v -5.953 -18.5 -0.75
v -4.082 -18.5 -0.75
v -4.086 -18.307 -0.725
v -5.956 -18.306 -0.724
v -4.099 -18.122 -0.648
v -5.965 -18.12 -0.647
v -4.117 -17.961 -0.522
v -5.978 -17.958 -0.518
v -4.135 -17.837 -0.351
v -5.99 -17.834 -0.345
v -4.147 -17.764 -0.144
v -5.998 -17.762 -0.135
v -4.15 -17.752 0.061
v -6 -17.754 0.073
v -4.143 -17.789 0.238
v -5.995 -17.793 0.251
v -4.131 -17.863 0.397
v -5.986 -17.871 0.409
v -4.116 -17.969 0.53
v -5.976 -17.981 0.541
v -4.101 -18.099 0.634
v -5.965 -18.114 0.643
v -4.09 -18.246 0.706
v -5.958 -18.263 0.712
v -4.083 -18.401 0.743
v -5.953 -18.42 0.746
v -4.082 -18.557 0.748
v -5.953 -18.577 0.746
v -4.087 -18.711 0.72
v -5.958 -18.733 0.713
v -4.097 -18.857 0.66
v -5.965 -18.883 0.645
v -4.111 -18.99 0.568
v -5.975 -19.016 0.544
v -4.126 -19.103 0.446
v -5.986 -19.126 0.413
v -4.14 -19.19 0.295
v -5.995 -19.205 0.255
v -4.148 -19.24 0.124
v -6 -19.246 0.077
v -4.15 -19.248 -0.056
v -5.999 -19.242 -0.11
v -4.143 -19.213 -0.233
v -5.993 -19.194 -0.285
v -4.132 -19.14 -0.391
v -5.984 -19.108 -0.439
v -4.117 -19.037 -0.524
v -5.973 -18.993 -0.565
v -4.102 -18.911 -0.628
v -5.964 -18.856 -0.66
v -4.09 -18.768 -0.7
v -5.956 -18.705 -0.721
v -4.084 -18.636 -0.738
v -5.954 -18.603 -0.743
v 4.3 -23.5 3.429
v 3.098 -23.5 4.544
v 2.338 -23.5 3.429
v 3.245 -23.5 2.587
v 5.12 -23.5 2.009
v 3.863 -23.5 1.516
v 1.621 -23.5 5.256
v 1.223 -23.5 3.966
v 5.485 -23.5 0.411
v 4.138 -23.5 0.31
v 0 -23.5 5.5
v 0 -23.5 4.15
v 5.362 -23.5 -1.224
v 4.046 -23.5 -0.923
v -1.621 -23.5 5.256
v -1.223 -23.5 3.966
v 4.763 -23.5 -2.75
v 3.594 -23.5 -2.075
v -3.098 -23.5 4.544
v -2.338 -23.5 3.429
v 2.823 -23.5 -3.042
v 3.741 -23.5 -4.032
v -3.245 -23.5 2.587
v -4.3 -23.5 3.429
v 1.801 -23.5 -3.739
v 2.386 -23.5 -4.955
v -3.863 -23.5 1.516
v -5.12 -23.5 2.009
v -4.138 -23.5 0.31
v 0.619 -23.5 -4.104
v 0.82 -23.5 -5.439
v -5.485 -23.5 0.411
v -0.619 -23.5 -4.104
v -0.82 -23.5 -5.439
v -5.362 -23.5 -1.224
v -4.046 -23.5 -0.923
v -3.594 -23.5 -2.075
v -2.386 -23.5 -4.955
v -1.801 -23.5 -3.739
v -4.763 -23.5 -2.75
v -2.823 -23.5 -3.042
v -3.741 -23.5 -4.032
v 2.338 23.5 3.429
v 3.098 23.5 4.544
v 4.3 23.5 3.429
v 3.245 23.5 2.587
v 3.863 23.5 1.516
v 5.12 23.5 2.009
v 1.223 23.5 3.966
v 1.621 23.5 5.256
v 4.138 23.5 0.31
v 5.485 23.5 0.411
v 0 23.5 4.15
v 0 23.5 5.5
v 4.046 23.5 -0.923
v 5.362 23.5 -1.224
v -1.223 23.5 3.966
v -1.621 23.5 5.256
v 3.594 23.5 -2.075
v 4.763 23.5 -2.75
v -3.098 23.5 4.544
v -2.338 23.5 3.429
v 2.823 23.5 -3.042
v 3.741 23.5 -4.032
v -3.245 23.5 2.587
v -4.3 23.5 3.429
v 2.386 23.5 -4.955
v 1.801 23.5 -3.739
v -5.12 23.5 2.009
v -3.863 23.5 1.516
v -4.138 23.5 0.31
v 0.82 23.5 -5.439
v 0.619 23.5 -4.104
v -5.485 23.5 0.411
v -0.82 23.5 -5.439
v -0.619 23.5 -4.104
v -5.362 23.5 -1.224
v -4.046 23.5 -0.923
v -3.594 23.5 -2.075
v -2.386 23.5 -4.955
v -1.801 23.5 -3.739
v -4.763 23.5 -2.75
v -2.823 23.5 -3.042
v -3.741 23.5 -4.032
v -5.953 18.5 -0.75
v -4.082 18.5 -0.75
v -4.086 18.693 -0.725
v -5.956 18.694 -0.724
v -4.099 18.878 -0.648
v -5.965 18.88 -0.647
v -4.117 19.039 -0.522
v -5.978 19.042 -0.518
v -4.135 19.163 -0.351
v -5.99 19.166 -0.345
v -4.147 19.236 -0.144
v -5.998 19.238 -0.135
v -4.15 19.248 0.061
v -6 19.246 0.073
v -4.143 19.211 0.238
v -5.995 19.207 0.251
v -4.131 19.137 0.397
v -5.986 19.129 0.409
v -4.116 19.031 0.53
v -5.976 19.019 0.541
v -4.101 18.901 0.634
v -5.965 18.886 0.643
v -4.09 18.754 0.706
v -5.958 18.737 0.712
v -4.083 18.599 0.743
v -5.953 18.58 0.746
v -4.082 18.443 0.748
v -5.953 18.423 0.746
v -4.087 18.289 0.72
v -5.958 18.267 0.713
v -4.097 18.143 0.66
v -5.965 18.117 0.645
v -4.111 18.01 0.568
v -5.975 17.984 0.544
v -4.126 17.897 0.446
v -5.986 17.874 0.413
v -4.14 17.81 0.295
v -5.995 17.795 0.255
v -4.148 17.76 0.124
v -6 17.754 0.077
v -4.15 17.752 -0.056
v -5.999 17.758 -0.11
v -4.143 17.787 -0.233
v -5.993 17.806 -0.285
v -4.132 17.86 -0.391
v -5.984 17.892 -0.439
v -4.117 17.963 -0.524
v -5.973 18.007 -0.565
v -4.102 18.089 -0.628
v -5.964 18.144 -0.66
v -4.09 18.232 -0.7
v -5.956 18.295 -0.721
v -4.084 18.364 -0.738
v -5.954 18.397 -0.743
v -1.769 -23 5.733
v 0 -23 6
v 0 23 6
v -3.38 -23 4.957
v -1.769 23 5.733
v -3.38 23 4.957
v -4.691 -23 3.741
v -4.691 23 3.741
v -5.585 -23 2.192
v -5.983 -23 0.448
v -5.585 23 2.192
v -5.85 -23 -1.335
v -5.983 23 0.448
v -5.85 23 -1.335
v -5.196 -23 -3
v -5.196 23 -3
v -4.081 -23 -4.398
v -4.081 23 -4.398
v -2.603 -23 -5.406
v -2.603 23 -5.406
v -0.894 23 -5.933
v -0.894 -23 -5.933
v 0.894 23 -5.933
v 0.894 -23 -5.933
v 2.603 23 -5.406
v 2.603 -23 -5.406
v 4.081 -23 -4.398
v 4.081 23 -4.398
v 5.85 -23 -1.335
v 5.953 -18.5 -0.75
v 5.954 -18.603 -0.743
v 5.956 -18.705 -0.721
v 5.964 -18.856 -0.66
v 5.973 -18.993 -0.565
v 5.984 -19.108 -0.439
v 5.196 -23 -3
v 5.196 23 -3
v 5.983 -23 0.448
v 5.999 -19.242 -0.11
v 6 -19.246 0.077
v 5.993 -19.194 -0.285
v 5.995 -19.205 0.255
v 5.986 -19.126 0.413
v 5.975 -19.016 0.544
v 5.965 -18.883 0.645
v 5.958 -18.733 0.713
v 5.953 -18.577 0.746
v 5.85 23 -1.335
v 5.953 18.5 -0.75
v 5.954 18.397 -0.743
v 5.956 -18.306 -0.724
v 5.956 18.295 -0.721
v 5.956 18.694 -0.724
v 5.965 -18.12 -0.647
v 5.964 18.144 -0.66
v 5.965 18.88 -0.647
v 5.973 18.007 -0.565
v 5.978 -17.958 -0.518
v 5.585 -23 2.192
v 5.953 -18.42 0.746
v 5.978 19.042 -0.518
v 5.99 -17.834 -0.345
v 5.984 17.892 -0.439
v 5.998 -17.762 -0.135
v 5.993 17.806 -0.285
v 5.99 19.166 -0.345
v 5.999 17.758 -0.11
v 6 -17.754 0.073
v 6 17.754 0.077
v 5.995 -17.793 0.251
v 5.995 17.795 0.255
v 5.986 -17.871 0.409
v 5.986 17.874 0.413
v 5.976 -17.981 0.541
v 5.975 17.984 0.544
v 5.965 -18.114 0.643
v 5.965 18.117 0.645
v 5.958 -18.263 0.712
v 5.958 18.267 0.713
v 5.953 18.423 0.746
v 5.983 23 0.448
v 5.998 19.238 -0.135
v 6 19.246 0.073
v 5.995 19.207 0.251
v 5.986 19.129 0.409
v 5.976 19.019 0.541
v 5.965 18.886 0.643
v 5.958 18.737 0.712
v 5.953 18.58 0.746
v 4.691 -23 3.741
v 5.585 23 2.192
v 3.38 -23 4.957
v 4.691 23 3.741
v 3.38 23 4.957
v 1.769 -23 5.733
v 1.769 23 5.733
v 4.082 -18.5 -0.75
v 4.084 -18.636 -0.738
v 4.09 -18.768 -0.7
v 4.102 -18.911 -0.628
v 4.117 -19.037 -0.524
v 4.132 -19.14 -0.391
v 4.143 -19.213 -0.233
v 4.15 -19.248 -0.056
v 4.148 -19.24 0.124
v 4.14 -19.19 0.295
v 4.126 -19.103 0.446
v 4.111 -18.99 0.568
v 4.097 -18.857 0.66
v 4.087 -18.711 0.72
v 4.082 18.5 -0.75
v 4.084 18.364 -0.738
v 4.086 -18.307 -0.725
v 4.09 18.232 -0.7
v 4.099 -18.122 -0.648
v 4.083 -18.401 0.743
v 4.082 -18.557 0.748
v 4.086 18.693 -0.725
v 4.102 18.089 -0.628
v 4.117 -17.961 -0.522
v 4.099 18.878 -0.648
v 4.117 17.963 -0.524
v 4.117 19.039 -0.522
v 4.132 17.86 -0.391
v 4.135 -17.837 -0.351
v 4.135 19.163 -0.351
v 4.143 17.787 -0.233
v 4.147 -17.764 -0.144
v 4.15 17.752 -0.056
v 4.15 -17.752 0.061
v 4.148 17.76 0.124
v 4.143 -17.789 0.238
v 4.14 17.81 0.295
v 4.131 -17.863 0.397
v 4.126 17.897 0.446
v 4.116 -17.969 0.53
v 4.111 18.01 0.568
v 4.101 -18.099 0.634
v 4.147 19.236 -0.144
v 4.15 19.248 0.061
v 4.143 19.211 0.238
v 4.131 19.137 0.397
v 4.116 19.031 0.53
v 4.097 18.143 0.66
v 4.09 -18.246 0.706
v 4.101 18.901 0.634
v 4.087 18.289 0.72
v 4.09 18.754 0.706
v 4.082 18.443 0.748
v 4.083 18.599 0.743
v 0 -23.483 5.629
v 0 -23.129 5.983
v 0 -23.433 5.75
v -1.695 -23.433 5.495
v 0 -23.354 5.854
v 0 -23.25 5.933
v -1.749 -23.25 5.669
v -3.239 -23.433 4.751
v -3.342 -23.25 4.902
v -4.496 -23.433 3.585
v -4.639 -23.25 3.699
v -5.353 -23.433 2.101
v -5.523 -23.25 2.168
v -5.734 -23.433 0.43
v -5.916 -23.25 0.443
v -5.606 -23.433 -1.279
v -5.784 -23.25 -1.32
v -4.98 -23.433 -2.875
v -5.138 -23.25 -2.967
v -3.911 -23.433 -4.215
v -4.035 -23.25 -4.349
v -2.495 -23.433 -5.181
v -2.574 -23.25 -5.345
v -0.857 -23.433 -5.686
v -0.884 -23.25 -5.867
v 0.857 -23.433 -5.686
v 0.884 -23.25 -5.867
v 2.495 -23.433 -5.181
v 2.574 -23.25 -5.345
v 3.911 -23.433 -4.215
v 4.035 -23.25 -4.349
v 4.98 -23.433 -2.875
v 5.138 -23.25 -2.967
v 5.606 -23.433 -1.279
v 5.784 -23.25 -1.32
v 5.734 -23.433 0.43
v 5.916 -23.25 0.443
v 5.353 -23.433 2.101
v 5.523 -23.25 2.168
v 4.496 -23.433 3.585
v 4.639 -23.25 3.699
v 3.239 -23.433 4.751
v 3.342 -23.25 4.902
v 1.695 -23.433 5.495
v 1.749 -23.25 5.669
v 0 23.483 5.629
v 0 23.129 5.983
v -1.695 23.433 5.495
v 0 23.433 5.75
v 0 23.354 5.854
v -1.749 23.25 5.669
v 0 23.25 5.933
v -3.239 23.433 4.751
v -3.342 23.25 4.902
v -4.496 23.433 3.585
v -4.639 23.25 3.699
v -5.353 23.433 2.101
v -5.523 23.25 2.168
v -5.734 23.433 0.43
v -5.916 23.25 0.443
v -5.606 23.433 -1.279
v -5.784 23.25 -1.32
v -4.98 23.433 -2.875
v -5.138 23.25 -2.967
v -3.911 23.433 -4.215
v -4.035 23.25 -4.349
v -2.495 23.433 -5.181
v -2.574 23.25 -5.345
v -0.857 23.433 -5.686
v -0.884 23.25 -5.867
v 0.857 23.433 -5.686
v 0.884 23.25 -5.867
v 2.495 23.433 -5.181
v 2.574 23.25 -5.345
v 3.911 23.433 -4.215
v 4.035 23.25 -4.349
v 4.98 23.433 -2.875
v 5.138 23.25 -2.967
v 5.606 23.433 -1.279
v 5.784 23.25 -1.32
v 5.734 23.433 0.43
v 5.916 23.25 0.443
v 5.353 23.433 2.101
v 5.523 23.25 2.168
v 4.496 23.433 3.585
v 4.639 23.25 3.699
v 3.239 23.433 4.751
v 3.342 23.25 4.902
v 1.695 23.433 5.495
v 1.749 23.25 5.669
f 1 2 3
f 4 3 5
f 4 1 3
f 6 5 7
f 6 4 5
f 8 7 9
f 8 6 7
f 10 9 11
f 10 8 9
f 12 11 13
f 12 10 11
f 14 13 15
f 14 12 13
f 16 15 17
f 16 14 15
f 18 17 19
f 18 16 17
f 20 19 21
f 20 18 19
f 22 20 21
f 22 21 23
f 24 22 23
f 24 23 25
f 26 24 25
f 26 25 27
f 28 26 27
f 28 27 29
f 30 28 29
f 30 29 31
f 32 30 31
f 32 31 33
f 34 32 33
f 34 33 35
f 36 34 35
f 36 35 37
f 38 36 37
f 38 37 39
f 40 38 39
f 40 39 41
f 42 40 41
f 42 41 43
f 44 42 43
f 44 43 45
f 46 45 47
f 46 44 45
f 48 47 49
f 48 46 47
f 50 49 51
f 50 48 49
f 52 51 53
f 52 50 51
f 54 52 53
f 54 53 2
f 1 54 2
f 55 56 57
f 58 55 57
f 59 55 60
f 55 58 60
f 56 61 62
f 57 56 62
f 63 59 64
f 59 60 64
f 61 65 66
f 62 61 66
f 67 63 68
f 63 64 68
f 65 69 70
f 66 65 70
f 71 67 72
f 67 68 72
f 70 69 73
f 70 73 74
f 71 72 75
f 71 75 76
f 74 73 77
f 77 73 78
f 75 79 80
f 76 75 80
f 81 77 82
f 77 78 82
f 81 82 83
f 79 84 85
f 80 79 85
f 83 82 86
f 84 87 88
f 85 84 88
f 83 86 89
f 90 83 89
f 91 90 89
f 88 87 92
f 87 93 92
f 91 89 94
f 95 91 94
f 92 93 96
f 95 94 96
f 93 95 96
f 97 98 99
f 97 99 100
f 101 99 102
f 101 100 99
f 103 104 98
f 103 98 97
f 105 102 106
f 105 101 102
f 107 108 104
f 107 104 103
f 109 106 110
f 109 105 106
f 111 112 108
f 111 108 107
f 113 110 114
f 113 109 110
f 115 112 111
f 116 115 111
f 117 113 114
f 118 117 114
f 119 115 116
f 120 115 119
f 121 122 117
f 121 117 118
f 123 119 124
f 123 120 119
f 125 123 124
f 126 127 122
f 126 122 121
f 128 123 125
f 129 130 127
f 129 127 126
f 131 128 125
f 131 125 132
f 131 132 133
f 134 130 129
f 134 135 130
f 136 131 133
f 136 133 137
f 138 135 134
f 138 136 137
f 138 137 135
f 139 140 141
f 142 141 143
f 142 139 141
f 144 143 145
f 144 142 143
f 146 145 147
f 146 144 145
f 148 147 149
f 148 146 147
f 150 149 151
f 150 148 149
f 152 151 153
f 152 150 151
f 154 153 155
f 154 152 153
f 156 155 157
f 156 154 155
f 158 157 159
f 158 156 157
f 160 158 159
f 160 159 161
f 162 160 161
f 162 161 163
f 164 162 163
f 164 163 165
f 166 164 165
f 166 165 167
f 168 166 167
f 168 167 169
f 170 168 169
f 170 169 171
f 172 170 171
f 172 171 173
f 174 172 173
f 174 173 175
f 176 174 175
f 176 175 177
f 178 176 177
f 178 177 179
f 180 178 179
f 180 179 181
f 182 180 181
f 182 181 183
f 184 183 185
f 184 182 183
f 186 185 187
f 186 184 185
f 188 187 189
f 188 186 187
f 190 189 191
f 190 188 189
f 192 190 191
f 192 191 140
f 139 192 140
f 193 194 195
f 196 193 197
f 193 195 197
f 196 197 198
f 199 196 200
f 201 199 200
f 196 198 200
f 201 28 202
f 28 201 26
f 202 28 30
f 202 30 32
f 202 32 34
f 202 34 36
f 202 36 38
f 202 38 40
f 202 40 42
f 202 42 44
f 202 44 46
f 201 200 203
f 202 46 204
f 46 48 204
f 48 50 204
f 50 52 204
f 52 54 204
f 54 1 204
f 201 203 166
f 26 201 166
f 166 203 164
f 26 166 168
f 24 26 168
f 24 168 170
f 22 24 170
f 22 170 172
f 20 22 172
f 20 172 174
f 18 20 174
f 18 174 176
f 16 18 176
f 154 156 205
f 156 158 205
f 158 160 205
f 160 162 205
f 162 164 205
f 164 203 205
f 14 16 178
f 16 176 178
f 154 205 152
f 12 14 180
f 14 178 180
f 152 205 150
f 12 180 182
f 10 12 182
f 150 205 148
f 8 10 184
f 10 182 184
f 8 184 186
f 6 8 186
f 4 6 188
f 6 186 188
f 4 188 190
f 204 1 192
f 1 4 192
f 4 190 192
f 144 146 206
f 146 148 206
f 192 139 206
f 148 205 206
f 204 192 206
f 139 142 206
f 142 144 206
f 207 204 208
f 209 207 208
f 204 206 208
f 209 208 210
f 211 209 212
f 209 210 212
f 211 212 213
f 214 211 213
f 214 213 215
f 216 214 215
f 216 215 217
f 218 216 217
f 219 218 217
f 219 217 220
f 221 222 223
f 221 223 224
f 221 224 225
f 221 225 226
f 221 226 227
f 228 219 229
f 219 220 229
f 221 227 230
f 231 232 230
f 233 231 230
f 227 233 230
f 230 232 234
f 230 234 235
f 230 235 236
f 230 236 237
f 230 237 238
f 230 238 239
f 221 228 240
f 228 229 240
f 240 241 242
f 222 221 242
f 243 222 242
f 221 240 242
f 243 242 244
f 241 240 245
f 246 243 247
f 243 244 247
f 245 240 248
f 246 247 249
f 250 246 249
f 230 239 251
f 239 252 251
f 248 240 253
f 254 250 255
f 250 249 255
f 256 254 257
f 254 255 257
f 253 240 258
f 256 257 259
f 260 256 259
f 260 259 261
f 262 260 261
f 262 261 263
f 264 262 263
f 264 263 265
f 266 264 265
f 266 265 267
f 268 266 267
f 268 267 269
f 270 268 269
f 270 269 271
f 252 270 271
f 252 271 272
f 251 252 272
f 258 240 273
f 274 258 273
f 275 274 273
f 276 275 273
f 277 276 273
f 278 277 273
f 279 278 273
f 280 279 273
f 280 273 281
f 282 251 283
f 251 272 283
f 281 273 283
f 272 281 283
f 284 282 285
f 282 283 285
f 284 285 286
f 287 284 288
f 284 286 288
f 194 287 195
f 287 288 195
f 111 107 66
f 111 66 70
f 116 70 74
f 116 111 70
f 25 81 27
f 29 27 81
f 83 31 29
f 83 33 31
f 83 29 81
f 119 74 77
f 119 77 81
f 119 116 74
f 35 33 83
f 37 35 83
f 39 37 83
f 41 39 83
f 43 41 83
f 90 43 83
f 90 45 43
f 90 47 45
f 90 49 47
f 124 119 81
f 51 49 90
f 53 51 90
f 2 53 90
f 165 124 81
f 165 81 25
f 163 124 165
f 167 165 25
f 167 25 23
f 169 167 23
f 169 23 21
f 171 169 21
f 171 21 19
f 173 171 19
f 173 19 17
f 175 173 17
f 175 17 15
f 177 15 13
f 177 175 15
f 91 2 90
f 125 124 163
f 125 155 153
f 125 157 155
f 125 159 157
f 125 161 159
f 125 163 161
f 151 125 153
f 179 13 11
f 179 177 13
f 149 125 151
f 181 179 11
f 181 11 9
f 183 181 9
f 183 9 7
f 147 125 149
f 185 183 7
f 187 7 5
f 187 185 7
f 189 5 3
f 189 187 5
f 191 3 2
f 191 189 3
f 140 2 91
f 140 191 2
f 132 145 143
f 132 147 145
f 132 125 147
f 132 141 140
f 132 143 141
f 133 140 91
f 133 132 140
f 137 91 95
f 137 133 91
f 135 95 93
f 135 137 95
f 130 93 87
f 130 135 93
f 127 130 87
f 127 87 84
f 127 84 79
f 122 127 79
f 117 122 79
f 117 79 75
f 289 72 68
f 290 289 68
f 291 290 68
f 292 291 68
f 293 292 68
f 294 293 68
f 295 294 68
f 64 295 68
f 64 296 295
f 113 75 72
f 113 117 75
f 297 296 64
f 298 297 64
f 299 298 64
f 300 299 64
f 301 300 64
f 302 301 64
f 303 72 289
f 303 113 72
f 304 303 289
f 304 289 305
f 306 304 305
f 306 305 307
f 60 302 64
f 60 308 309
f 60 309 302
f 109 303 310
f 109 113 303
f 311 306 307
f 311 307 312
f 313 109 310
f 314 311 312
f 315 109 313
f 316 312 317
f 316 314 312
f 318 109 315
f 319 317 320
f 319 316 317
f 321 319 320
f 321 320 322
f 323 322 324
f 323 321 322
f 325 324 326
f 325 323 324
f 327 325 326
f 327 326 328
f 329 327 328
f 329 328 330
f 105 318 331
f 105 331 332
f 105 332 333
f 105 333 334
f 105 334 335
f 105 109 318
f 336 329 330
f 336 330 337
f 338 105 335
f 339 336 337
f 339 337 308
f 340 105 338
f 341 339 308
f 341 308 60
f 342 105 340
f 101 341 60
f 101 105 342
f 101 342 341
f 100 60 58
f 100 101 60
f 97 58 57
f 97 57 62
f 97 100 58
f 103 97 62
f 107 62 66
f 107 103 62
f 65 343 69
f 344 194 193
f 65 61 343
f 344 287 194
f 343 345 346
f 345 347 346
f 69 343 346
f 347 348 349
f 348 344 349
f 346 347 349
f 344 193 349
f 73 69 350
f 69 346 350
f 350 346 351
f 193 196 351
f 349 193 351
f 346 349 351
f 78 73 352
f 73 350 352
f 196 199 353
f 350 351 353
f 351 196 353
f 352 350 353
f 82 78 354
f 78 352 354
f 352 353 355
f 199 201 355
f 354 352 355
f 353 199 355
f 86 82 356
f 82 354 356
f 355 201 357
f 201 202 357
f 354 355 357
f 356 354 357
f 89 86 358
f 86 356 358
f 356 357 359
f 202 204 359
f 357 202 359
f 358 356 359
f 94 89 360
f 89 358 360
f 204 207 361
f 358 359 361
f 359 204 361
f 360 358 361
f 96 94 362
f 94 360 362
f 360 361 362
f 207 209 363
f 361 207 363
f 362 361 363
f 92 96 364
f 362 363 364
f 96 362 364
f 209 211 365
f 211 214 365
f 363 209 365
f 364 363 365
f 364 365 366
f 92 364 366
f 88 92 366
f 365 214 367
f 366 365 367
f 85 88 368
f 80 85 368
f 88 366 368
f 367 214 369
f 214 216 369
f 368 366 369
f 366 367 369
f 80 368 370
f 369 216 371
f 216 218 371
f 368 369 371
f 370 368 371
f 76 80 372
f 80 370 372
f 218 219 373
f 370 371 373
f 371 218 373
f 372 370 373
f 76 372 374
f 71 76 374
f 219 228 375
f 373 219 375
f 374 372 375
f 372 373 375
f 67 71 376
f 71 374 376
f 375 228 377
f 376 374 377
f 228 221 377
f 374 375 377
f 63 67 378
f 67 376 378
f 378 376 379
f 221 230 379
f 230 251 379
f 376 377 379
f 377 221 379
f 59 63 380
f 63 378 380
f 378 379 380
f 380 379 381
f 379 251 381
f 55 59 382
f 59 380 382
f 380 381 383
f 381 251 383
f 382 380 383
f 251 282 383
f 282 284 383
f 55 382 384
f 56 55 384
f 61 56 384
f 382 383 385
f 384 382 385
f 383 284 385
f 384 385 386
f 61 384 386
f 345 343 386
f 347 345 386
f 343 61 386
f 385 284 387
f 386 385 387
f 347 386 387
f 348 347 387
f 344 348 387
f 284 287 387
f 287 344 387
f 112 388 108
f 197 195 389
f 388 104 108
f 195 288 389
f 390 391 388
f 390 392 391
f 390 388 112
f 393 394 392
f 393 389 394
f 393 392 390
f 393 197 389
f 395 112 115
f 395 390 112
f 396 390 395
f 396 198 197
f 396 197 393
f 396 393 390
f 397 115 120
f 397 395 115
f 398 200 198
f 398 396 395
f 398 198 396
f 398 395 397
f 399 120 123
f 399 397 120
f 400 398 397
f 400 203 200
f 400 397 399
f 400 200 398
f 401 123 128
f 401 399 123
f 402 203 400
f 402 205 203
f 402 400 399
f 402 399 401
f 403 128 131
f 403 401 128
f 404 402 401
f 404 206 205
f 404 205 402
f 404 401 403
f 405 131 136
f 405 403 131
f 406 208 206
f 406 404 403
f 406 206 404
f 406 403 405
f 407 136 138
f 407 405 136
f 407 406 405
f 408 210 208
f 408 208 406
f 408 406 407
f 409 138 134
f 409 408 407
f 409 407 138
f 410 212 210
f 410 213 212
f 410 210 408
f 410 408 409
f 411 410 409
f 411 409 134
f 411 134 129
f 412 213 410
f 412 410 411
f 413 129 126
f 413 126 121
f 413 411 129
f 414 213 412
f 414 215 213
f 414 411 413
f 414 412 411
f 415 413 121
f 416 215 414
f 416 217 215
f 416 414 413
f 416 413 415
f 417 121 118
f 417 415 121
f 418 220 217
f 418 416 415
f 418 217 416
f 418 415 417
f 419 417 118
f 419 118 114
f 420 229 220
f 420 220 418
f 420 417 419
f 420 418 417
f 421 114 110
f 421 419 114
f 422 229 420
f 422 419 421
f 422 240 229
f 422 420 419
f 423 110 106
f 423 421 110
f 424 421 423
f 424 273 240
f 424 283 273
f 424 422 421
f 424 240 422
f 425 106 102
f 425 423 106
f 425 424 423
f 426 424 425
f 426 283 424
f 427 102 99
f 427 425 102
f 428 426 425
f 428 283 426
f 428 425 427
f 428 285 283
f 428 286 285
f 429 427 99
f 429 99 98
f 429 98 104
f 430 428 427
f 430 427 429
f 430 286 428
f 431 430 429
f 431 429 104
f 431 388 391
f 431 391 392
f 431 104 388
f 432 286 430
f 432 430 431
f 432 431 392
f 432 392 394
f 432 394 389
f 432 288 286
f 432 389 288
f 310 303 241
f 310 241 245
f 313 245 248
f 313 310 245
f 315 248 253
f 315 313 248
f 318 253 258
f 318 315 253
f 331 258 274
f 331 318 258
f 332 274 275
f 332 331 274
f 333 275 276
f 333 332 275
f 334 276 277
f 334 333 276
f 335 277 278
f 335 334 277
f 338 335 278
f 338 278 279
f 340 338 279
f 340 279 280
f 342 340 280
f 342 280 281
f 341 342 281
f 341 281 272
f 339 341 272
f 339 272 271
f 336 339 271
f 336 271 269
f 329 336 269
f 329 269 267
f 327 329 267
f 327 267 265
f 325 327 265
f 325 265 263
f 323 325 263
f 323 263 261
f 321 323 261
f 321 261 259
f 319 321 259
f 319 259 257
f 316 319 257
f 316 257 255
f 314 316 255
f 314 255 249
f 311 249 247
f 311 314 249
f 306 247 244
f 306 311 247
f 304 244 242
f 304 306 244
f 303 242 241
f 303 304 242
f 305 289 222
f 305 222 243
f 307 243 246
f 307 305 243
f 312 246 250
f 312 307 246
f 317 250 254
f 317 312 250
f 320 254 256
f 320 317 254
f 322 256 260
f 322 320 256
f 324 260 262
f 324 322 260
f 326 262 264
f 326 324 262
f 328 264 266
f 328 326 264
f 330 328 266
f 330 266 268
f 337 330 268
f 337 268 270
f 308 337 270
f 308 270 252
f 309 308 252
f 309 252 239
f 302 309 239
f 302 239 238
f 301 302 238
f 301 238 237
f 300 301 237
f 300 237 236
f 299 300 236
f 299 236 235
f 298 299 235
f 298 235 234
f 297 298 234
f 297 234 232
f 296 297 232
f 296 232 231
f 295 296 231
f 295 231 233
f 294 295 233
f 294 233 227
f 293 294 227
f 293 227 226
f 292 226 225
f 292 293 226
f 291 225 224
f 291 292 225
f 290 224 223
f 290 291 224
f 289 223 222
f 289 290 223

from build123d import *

# Parameters (mm, degrees)
SKETCH1_W               = 1.85
SKETCH1_H               = 47
CUT_EXTRUDE1_DEPTH      = 25.984995497
CUT_EXTRUDE1_DEPTH_BACK = 25.984995497
SKETCH2_R               = 0.75
FILLET1_R               = 0.5


with BuildPart() as part:
    # Sketch1 → Revolve1 (revolve)
    with BuildSketch(Plane(origin=(0, 0, 0), x_dir=(0, 0, -1), z_dir=(1, 0, 0)), mode=Mode.PRIVATE) as revolve1_sk:
        with Locations((5.075, 0)):
            Rectangle(SKETCH1_W, SKETCH1_H)
    revolve(revolve1_sk.sketch.rotate(Axis((0, 43.756475867, 0), (0, -1, 0)), 180), axis=Axis((0, 43.756475867, 0), (0, -1, 0)))

    # Sketch2 → Cut-Extrude1 (cut, two sides: drawn at the far end of the back side and taken through both)
    with BuildSketch(Plane(origin=(0, 0, 0), x_dir=(0, 0, -1), z_dir=(1, 0, 0)).offset(-CUT_EXTRUDE1_DEPTH_BACK)):
        with Locations((0, 18.5)):
            Circle(SKETCH2_R)
        with Locations((0, -18.5)):
            Circle(SKETCH2_R)
    extrude(amount=CUT_EXTRUDE1_DEPTH + CUT_EXTRUDE1_DEPTH_BACK, mode=Mode.SUBTRACT)

    # Fillet1
    fillet1_edges = [part.edges().sort_by_distance(p)[0] for p in [
        (0, -23.5, -6),
        (0, 23.5, -6),
    ]]
    fillet(fillet1_edges, radius=FILLET1_R)


solid = part.part
